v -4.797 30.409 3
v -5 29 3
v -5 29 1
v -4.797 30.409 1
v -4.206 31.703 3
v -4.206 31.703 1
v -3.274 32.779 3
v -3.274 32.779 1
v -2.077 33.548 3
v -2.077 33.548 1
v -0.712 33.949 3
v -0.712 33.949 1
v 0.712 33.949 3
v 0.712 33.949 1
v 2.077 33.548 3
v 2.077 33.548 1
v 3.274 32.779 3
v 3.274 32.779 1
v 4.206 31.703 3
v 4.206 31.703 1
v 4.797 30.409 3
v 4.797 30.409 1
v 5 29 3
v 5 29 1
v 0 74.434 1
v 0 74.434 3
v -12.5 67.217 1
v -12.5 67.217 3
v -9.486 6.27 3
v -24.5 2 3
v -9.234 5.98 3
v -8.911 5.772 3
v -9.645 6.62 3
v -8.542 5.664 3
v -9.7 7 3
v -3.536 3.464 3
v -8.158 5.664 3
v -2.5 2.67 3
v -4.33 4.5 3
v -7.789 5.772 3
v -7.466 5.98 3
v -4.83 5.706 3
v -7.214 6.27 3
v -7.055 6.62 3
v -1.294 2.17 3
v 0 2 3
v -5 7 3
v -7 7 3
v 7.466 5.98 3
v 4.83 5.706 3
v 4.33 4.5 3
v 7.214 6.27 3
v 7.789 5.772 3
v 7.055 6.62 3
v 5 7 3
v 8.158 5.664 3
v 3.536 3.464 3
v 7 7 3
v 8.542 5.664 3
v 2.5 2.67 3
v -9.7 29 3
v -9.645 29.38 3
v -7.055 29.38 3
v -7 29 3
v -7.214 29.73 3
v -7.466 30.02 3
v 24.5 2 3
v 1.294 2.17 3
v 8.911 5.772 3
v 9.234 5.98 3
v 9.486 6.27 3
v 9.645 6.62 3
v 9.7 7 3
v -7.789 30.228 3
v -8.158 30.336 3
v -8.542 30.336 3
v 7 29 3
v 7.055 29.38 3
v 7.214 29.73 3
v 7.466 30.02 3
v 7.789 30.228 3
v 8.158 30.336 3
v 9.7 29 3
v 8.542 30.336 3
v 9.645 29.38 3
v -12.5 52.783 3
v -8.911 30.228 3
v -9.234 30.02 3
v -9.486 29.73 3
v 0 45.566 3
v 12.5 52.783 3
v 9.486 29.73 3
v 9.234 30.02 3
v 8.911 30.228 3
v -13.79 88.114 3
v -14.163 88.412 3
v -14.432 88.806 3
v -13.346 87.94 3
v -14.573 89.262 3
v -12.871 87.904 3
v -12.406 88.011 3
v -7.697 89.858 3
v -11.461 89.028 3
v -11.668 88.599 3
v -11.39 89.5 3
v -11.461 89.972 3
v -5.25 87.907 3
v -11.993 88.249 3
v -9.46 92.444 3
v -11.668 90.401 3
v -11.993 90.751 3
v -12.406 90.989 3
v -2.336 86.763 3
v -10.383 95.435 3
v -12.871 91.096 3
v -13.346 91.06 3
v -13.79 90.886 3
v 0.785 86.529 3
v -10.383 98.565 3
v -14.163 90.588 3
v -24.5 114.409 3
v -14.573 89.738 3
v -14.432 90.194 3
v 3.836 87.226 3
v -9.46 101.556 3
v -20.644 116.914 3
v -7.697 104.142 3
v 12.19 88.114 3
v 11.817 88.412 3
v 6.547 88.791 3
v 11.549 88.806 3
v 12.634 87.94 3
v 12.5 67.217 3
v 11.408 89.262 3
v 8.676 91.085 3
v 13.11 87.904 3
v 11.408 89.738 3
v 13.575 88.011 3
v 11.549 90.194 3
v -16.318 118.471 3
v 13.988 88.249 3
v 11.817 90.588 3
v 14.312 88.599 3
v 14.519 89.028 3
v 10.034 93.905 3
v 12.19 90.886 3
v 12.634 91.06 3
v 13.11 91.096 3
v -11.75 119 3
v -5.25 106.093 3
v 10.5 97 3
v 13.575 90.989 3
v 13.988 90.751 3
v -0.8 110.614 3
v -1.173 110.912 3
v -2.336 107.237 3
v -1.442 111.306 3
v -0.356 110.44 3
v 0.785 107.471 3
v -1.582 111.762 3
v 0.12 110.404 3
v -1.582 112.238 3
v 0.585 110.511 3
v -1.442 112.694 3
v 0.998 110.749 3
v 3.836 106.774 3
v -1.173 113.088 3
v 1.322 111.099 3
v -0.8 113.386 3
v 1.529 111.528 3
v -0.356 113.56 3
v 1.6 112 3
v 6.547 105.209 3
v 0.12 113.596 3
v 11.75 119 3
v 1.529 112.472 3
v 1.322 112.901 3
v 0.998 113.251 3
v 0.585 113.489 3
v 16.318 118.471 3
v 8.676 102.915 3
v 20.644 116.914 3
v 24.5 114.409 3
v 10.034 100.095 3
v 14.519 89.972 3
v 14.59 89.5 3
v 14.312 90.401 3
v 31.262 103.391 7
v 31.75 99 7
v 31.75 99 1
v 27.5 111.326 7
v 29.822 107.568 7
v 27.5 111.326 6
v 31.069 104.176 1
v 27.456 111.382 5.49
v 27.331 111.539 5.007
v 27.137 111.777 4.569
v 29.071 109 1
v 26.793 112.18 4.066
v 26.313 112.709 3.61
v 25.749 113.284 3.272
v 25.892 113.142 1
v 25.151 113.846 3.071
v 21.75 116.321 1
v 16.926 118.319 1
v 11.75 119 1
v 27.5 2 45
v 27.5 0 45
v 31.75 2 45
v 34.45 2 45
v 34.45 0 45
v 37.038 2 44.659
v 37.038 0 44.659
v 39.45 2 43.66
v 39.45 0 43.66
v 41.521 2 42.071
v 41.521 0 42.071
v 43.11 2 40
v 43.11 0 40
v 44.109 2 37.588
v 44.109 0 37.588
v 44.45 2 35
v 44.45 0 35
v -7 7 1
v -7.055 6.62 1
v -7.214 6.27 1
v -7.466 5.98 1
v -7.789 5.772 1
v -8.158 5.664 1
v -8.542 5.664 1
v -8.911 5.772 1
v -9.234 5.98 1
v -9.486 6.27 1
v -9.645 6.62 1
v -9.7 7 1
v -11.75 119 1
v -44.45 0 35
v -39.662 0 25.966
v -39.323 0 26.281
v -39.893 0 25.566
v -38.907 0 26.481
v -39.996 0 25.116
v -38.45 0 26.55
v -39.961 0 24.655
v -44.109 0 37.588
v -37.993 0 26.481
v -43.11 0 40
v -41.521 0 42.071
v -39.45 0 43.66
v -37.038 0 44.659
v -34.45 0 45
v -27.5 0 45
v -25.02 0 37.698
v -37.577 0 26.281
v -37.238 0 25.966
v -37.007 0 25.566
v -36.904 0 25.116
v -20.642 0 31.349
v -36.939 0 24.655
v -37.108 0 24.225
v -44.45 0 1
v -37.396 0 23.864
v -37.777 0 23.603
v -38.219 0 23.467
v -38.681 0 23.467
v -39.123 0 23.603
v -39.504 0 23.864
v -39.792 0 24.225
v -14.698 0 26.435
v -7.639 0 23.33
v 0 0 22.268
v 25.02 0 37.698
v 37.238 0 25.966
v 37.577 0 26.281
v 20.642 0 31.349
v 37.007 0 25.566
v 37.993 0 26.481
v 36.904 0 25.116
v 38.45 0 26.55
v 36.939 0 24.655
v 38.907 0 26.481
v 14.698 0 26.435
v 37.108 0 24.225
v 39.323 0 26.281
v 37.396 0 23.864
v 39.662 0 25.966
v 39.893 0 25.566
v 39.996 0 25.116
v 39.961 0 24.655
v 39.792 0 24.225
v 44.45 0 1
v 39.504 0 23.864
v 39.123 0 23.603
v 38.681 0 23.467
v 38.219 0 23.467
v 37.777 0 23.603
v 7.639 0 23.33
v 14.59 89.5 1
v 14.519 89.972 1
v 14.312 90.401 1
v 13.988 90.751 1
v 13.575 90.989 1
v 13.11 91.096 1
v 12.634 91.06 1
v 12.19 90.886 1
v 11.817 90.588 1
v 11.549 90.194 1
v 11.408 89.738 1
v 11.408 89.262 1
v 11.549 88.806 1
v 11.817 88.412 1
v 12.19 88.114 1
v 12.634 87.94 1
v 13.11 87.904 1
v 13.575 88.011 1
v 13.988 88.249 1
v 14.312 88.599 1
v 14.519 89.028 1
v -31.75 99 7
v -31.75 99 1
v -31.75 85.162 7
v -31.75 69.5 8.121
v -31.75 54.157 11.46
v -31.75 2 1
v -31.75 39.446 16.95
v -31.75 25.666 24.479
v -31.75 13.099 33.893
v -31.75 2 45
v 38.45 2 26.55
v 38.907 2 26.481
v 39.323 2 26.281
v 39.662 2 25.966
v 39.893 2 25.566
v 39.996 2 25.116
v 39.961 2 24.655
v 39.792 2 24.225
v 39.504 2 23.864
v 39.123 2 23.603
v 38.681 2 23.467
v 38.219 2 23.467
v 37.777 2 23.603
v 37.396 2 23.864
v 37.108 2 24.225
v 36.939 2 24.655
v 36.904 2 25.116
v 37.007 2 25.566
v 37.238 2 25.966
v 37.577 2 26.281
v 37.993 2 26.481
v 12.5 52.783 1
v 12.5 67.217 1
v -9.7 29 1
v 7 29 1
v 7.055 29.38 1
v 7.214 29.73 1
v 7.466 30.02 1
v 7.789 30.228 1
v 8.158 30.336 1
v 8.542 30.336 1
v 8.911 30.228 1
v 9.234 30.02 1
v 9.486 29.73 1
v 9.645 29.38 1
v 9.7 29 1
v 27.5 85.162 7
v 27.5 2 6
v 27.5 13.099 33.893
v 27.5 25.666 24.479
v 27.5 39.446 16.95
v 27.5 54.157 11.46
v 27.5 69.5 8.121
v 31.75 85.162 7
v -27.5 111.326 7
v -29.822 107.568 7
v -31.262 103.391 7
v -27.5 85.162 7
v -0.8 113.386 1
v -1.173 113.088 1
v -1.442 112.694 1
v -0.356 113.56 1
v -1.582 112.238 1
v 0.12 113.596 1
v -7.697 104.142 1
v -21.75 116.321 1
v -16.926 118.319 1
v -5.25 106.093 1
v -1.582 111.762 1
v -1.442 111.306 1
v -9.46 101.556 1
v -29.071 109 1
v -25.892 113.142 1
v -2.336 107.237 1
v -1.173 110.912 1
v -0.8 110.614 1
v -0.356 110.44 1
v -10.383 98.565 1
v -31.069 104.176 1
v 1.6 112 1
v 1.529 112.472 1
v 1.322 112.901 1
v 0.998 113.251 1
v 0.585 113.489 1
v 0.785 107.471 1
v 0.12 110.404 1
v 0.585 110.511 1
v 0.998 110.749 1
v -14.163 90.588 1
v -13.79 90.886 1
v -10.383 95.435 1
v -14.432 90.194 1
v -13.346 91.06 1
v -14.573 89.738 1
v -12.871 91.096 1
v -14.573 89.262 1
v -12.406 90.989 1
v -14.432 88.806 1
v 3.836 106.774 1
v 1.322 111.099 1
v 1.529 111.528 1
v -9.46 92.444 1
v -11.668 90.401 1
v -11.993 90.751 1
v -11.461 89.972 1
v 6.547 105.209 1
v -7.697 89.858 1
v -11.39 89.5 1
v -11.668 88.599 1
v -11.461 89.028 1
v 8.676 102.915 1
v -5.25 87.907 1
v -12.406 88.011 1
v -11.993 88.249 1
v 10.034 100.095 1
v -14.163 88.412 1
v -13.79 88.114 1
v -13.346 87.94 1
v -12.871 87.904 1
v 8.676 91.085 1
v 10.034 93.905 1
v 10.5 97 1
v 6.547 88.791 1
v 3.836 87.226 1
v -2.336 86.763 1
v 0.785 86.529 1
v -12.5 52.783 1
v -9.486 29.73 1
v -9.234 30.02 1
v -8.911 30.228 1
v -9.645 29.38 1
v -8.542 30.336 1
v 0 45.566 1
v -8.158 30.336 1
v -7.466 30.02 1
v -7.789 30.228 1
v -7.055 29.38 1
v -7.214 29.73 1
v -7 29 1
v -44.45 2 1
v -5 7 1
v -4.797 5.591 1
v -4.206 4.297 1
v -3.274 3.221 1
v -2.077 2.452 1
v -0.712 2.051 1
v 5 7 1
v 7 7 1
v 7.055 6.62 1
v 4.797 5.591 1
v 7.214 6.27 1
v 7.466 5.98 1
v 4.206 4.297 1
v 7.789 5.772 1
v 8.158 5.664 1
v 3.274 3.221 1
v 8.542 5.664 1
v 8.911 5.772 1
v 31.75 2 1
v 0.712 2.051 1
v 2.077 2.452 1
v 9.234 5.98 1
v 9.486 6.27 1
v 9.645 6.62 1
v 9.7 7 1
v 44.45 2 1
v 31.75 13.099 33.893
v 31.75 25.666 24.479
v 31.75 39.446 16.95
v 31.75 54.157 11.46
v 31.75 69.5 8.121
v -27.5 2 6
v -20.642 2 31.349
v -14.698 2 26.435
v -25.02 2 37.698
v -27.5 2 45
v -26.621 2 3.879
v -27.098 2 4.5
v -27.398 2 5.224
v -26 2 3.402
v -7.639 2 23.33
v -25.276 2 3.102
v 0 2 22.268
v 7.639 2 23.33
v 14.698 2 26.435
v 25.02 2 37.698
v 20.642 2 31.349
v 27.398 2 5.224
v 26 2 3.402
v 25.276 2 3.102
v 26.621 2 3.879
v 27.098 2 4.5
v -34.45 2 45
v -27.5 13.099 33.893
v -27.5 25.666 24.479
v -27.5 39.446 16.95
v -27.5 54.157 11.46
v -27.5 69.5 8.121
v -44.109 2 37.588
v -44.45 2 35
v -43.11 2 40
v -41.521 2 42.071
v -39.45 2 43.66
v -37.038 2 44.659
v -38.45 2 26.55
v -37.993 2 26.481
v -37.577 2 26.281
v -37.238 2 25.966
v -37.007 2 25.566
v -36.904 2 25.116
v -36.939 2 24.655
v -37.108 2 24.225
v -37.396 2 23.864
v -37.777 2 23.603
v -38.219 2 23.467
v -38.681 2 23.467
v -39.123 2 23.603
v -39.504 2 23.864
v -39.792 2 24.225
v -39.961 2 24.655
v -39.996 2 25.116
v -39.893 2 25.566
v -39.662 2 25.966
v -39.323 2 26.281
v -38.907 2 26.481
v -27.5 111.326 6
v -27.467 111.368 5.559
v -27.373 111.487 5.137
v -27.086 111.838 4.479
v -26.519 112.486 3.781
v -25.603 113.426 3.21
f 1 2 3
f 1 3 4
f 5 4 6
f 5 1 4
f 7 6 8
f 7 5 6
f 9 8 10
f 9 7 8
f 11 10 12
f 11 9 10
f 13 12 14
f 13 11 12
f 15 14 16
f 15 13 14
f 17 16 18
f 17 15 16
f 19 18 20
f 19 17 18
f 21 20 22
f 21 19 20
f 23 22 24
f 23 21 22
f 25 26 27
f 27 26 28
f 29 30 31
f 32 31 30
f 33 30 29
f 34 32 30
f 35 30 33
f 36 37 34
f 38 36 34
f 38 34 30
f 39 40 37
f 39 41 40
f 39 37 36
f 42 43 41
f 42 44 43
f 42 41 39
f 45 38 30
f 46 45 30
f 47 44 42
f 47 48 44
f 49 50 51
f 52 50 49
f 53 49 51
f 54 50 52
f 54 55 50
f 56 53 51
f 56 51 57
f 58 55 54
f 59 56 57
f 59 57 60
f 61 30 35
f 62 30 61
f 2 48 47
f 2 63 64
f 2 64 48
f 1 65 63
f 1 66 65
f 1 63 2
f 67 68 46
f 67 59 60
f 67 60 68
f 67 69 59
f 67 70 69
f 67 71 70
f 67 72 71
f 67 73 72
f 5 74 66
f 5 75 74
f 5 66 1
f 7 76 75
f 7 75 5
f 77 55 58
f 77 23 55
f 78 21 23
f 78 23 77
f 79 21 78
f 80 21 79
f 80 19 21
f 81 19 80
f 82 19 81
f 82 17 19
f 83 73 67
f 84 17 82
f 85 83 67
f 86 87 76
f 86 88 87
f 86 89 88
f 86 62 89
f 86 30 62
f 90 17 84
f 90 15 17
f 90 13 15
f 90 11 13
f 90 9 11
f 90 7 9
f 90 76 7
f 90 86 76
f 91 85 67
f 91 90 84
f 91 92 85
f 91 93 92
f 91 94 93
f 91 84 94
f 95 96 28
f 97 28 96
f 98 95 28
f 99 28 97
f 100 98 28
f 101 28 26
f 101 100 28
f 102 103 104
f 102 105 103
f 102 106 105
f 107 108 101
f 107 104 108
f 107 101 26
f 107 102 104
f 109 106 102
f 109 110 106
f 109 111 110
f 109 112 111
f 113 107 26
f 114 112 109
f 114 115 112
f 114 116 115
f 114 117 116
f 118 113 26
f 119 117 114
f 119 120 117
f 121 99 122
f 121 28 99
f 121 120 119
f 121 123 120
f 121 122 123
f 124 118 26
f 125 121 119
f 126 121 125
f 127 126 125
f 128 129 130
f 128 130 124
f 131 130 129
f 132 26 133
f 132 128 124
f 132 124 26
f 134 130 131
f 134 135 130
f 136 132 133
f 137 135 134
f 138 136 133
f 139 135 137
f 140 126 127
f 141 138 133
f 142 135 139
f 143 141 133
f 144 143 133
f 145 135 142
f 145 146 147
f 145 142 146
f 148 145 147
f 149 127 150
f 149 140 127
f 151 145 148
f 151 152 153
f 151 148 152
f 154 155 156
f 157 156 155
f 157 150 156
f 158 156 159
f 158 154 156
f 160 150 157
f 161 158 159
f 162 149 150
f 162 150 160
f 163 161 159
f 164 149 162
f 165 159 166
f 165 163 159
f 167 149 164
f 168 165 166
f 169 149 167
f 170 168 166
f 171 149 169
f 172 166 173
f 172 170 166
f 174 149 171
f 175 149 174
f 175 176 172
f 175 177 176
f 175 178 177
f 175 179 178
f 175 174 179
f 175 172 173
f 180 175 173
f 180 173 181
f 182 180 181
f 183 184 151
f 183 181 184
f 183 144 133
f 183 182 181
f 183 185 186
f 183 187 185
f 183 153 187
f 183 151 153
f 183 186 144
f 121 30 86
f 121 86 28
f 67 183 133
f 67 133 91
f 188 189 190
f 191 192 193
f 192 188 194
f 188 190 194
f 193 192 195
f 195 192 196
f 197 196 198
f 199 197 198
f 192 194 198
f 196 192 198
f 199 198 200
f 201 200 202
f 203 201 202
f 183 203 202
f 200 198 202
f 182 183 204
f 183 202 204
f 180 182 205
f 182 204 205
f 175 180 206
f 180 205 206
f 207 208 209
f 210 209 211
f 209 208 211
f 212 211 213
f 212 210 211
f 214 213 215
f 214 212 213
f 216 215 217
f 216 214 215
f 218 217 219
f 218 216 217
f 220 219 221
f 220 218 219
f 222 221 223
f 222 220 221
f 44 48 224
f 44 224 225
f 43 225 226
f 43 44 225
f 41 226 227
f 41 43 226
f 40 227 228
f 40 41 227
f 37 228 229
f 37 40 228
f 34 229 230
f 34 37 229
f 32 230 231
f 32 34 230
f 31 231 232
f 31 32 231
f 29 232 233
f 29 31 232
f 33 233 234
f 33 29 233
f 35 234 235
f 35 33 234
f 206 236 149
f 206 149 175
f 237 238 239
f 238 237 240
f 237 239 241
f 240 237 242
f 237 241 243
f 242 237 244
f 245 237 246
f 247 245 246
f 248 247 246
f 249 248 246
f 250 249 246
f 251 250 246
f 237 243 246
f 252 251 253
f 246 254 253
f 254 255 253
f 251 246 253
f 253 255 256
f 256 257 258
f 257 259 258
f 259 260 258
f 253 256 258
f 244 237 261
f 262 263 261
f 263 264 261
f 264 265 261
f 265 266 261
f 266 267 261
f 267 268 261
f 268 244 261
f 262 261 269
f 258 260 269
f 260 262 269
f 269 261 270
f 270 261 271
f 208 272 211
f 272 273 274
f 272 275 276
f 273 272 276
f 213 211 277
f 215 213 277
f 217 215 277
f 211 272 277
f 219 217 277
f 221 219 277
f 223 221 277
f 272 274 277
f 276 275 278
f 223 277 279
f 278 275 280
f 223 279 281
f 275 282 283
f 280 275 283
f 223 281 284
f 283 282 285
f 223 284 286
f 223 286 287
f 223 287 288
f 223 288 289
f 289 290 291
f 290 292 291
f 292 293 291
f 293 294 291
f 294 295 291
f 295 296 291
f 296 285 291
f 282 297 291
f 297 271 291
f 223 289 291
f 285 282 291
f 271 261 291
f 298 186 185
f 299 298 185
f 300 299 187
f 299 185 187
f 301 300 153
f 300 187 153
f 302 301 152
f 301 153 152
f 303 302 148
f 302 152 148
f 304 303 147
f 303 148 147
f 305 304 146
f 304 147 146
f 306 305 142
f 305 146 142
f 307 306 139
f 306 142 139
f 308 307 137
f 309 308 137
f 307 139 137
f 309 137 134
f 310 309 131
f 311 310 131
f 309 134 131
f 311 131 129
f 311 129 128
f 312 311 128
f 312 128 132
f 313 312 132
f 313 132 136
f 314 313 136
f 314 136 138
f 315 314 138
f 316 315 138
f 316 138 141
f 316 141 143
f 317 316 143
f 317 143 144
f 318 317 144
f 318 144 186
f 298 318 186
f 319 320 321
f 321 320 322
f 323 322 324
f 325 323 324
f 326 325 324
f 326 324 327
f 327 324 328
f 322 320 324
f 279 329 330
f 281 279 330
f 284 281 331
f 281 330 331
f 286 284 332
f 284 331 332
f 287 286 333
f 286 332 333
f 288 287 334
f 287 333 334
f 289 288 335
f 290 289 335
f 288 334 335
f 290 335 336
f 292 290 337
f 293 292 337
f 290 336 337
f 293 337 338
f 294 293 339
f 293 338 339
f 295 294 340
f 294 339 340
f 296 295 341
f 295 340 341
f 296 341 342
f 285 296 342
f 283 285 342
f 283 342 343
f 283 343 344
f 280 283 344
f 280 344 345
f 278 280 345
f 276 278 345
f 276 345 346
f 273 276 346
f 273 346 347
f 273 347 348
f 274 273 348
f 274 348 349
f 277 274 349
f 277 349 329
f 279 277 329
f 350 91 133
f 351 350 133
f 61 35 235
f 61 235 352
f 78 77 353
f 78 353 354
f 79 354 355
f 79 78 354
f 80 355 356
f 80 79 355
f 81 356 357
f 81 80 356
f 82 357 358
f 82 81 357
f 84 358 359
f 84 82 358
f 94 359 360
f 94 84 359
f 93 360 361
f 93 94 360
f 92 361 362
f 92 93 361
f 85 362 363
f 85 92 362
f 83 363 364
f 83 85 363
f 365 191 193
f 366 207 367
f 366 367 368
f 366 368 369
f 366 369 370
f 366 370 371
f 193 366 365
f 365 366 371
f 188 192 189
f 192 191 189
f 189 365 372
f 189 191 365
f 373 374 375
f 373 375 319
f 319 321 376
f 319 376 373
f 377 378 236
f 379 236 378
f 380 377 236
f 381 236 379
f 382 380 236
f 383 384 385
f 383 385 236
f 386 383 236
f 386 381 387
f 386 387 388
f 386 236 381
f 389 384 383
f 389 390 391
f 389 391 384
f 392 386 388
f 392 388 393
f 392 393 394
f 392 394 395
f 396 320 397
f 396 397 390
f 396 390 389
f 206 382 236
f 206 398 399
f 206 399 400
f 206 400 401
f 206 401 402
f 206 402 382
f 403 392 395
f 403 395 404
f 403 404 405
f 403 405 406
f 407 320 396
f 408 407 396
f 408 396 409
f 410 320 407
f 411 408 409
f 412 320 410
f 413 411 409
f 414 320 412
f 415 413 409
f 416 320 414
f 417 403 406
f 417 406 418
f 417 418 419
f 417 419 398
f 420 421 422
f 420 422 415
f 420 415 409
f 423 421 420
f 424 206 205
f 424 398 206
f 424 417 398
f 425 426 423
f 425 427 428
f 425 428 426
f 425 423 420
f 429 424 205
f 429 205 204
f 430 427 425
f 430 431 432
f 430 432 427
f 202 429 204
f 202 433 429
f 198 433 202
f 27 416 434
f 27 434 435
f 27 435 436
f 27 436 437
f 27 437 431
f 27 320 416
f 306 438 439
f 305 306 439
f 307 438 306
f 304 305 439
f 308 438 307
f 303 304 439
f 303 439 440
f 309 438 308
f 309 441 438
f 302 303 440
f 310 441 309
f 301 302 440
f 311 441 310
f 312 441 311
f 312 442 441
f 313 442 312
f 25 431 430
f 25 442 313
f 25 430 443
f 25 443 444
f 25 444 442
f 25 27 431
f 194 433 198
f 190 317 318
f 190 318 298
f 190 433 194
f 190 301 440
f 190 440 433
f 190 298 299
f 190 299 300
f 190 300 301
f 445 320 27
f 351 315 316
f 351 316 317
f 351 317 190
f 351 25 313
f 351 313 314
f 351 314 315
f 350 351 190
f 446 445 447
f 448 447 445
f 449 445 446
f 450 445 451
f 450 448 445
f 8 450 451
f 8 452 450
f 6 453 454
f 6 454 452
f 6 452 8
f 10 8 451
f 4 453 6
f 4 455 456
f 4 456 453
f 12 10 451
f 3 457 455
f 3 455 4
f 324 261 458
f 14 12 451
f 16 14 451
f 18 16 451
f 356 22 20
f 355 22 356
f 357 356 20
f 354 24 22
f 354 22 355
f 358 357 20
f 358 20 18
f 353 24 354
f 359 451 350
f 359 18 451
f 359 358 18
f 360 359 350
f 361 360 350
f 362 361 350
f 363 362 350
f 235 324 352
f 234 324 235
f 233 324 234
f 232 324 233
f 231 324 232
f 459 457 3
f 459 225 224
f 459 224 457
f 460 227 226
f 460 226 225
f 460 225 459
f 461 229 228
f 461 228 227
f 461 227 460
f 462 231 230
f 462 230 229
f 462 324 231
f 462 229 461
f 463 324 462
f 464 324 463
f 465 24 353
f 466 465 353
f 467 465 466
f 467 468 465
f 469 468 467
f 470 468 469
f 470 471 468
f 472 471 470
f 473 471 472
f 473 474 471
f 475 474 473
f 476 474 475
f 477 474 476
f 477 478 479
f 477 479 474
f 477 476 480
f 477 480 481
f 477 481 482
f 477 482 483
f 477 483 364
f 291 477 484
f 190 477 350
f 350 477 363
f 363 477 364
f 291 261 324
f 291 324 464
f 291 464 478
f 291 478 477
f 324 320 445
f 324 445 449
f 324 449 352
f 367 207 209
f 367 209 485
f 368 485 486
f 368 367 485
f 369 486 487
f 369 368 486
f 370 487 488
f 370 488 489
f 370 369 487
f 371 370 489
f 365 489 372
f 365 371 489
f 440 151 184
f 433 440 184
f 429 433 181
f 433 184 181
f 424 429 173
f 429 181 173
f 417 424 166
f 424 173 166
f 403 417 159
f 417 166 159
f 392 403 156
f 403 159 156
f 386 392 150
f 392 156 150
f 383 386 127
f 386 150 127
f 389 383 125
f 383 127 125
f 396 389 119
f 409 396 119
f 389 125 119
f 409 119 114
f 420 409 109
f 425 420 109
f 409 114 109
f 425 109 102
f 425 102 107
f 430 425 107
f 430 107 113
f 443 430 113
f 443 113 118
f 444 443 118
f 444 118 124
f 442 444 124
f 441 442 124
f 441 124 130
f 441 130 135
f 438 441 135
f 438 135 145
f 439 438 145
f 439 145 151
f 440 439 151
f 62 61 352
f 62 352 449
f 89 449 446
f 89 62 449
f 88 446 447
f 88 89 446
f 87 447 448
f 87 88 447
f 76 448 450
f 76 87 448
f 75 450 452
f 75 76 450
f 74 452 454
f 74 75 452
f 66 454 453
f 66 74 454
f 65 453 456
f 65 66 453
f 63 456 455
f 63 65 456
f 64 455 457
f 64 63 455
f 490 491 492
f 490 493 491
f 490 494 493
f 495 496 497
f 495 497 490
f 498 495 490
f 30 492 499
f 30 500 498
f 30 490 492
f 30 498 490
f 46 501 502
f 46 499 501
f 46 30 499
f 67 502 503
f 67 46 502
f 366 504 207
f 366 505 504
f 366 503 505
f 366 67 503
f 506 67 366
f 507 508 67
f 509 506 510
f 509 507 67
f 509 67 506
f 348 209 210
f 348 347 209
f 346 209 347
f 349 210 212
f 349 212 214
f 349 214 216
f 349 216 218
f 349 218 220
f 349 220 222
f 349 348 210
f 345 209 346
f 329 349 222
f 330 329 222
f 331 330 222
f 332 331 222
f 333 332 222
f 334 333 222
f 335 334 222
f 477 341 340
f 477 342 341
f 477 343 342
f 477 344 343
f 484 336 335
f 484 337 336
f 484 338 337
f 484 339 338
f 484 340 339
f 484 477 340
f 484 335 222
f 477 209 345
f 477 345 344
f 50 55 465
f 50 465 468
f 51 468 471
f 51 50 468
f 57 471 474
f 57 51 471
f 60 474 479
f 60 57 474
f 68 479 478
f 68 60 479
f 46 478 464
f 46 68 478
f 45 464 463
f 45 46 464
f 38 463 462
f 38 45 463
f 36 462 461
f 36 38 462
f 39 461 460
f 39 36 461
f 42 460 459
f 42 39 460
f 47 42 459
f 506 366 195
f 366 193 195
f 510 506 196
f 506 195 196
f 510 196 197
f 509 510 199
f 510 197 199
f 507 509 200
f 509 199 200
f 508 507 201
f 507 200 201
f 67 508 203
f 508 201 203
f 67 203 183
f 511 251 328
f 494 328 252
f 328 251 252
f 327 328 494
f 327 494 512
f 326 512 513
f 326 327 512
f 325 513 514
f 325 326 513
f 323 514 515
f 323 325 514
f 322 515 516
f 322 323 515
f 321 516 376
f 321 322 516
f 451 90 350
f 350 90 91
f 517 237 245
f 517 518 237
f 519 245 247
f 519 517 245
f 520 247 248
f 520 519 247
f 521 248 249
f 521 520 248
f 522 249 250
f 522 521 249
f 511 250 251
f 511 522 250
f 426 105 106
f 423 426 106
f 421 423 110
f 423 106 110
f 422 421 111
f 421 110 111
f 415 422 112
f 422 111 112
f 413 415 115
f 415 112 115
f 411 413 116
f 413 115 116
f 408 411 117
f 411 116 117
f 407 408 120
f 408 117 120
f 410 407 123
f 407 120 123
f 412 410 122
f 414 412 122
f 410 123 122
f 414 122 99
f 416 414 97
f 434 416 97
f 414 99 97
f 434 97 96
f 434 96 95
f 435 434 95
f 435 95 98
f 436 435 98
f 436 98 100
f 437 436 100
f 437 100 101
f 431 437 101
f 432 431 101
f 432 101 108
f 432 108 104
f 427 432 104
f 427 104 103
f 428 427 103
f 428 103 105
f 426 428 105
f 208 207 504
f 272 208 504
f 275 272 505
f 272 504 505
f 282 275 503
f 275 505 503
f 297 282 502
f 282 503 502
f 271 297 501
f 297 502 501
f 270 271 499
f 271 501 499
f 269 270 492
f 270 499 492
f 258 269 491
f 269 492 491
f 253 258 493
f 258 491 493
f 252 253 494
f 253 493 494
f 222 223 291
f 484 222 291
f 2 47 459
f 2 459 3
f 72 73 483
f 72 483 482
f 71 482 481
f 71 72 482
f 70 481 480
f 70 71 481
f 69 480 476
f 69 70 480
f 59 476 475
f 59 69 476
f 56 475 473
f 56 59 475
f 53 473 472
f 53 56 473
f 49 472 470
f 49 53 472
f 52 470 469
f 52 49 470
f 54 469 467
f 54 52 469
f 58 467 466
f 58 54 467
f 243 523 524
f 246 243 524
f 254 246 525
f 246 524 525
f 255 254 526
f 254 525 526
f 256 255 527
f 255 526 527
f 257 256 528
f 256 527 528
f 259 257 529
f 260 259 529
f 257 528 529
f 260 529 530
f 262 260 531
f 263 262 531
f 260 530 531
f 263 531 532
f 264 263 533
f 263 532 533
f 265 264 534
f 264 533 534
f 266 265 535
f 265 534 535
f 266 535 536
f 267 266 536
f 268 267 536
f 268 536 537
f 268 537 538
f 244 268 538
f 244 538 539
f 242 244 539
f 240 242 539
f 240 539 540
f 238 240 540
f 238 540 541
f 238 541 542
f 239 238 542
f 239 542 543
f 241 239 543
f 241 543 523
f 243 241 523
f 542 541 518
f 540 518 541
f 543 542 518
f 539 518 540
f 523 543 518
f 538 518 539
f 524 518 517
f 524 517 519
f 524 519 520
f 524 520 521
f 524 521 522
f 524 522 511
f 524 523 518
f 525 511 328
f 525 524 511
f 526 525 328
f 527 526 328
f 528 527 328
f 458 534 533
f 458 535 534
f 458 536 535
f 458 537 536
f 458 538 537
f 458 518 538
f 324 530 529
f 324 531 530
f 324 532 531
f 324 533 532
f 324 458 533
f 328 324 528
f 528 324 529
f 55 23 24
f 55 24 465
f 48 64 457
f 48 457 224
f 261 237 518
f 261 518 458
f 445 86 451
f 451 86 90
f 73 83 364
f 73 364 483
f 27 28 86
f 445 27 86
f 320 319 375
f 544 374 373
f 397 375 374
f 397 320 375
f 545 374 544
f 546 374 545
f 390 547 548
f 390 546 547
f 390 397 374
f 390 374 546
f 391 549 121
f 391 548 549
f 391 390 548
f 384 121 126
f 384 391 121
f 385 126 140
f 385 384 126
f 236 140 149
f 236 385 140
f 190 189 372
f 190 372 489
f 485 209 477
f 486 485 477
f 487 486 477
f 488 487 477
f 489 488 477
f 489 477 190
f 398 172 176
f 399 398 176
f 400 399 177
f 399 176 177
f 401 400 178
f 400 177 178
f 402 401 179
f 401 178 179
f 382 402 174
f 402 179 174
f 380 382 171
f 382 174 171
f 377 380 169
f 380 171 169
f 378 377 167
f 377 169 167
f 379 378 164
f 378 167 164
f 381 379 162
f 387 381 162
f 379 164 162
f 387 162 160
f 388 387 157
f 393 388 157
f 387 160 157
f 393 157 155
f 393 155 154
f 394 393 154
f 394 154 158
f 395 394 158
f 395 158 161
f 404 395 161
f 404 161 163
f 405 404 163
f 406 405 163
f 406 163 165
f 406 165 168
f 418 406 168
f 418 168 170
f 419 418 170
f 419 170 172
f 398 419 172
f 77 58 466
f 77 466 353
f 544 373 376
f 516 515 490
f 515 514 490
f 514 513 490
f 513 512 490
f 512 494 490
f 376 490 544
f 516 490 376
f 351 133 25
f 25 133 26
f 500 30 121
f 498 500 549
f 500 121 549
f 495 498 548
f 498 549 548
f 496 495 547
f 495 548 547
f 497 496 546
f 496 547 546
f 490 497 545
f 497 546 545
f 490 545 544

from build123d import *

# Parameters (mm, degrees)
SKETCH1_W           = 88.9
SKETCH1_H           = 90
BASE_DEPTH          = 2
SKETCH2_W           = 63.5
SKETCH2_H           = 6
FACE_PLATE_DEPTH    = 117
SKETCH5_R           = 10.5
SKETCH5_R_2         = 1.6
FACE_HOLES_DEPTH    = 138.261802771
FILLET2_R           = 10
FILLET3_R           = 20
SKETCH23_W          = 55
SKETCH23_H          = 117
CUT_EXTRUDE6_DEPTH  = 4
FILLET4_R           = 110
SKETCH24_W          = 88.9
SKETCH24_H          = 46
CUT_EXTRUDE7_DEPTH  = 3
SKETCH25_R          = 1.55
CUT_EXTRUDE8_DEPTH  = 134.003016883
CUT_EXTRUDE9_DEPTH  = 134.003016883
FILLET5_R           = 3
CUT_EXTRUDE10_DEPTH = 134.793880741


with BuildPart() as part:
    # Sketch1 → Base (new body)
    with BuildSketch(Plane(origin=(0, 0, 0), x_dir=(1, 0, 0), z_dir=(0, 1, 0))):
        Rectangle(SKETCH1_W, SKETCH1_H)
    extrude(amount=BASE_DEPTH)

    # Sketch2 → Face Plate (add)
    with BuildSketch(Plane(origin=(0, 2, 0), x_dir=(1, 0, 0), z_dir=(0, 1, 0))):
        with Locations((0, -4)):
            Rectangle(SKETCH2_W, SKETCH2_H)
    extrude(amount=FACE_PLATE_DEPTH)

    # Sketch5 → Face Holes (cut, through all)
    with BuildSketch(Plane.XY.offset(7)):
        with Locations((0, 97)):
            Circle(SKETCH5_R)
        with Locations((12.990381057, 89.5)):
            Circle(SKETCH5_R_2)
        with Locations((-12.990381057, 89.5)):
            Circle(SKETCH5_R_2)
        with Locations((0, 112)):
            Circle(SKETCH5_R_2)
        with BuildLine():
            Line((-9.7, 7), (-9.7, 29))
            ThreePointArc((-9.7, 29), (-8.35, 30.35), (-7, 29))
            Line((-7, 29), (-7, 7))
            ThreePointArc((-7, 7), (-8.35, 5.65), (-9.7, 7))
        make_face()
        with BuildLine():
            Line((9.7, 29), (9.7, 7))
            ThreePointArc((9.7, 7), (8.35, 5.65), (7, 7))
            Line((7, 7), (7, 29))
            ThreePointArc((7, 29), (8.35, 30.35), (9.7, 29))
        make_face()
        with BuildLine():
            Line((-5, 7), (-5, 29))
            ThreePointArc((-5, 29), (0, 34), (5, 29))
            Line((5, 29), (5, 7))
            ThreePointArc((5, 7), (0, 2), (-5, 7))
        make_face()
    extrude(amount=-FACE_HOLES_DEPTH, mode=Mode.SUBTRACT)

    # Fillet2
    fillet2_edges = [part.edges().sort_by_distance(p)[0] for p in [
        (-44.45, 1, -45),
        (44.45, 1, -45),
        (44.45, 1, 45),
        (-44.45, 1, 45),
    ]]
    fillet(fillet2_edges, radius=FILLET2_R)

    # Fillet3
    fillet3_edges = [part.edges().sort_by_distance(p)[0] for p in [
        (-31.75, 119, 4),
        (31.75, 119, 4),
    ]]
    fillet(fillet3_edges, radius=FILLET3_R)

    # Sketch23 → Cut-Extrude6 (cut)
    with BuildSketch(Plane.XY.offset(7)):
        with Locations((0, 60.5)):
            Rectangle(SKETCH23_W, SKETCH23_H)
    extrude(amount=-CUT_EXTRUDE6_DEPTH, mode=Mode.SUBTRACT)

    # Fillet4
    # the kernel refuses this fillet: 110 mm, written as the material it adds along each edge
    with BuildSketch(Plane(origin=(-180.406228863, 2, 7), x_dir=(0, 0, 1), z_dir=(1, 0, 0))) as fillet4_piece_1_section:
        with BuildLine():
            CenterArc((110, -83.162491545), FILLET4_R, 130.885192893, 49.114807107)
            Line((0, -83.162491545), (0, 0))
            Line((0, 0), (38, 0))
        make_face()
    fillet4_piece_1 = extrude(amount=420.062457726, mode=Mode.PRIVATE)
    fillet4_piece_1 = split(fillet4_piece_1, bisect_by=Plane(origin=(-31.75, 51.263709825, 12.122352248), z_dir=(1, 0, 0)), keep=Keep.TOP, mode=Mode.PRIVATE)
    fillet4_piece_1 = split(fillet4_piece_1, bisect_by=Plane(origin=(-27.5, 51.263709825, 12.122352248), z_dir=(-1, 0, 0)), keep=Keep.TOP, mode=Mode.PRIVATE)
    add(fillet4_piece_1)
    with BuildSketch(Plane(origin=(27.5, 2, 7), x_dir=(0, 0, 1), z_dir=(1, 0, 0)), Plane(origin=(-31.75, 2, 7), x_dir=(0, 0, 1), z_dir=(1, 0, 0))) as fillet4_piece_2:
        with BuildLine():
            CenterArc((110, -83.162491545), FILLET4_R, 130.885192893, 49.114807107)
            Line((0, -83.162491545), (0, 0))
            Line((0, 0), (38, 0))
        make_face()
    extrude(amount=4.25)
    with BuildSketch(Plane(origin=(-239.656228863, 2, 7), x_dir=(0, 0, 1), z_dir=(1, 0, 0))) as fillet4_piece_3_section:
        with BuildLine():
            CenterArc((110, -83.162491545), FILLET4_R, 130.885192893, 49.114807107)
            Line((0, -83.162491545), (0, 0))
            Line((0, 0), (38, 0))
        make_face()
    fillet4_piece_3 = extrude(amount=420.062457726, mode=Mode.PRIVATE)
    fillet4_piece_3 = split(fillet4_piece_3, bisect_by=Plane(origin=(31.75, 51.263709825, 12.122352248), z_dir=(-1, 0, 0)), keep=Keep.TOP, mode=Mode.PRIVATE)
    fillet4_piece_3 = split(fillet4_piece_3, bisect_by=Plane(origin=(27.5, 51.263709825, 12.122352248), z_dir=(1, 0, 0)), keep=Keep.TOP, mode=Mode.PRIVATE)
    add(fillet4_piece_3)

    # Sketch24 → Cut-Extrude7 (cut)
    with BuildSketch(Plane(origin=(0, 2, 0), x_dir=(1, 0, 0), z_dir=(0, 1, 0))):
        with Locations((0, 22)):
            Rectangle(SKETCH24_W, SKETCH24_H)
    extrude(amount=-CUT_EXTRUDE7_DEPTH, mode=Mode.SUBTRACT)

    # Sketch25 → Cut-Extrude8 (cut, through all)
    with BuildSketch(Plane(origin=(0, 2, 0), x_dir=(1, 0, 0), z_dir=(0, 1, 0))):
        with Locations(Location((38.45, -25, 0), (0, 0, 270))):
            Circle(SKETCH25_R)
        with Locations(Location((-38.45, -25, 0), (0, 0, 270))):
            Circle(SKETCH25_R)
    extrude(amount=-CUT_EXTRUDE8_DEPTH, mode=Mode.SUBTRACT)

    # Sketch26 → Cut-Extrude9 (cut, through all)
    with BuildSketch(Plane(origin=(0, 2, 0), x_dir=(1, 0, 0), z_dir=(0, 1, 0))):
        with BuildLine():
            Line((-27.5, -45), (27.5, -45))
            ThreePointArc((27.5, -45), (0, -22.267826876), (-27.5, -45))
        make_face()
    extrude(amount=-CUT_EXTRUDE9_DEPTH, mode=Mode.SUBTRACT)

    # Fillet5
    fillet5_edges = [part.edges().sort_by_distance(p)[0] for p in [
        (27.5, 56.663146518, 3),
        (-27.5, 56.663146518, 3),
    ]]
    fillet(fillet5_edges, radius=FILLET5_R)

    # Sketch27 → Cut-Extrude10 (cut, through all)
    with BuildSketch(Plane.XY.offset(3)):
        Polygon((0, 45.56624327), (12.5, 52.783121635), (12.5, 67.216878365), (0, 74.43375673), (-12.5, 67.216878365), (-12.5, 52.783121635), align=None)
    extrude(amount=-CUT_EXTRUDE10_DEPTH, mode=Mode.SUBTRACT)


solid = part.part
